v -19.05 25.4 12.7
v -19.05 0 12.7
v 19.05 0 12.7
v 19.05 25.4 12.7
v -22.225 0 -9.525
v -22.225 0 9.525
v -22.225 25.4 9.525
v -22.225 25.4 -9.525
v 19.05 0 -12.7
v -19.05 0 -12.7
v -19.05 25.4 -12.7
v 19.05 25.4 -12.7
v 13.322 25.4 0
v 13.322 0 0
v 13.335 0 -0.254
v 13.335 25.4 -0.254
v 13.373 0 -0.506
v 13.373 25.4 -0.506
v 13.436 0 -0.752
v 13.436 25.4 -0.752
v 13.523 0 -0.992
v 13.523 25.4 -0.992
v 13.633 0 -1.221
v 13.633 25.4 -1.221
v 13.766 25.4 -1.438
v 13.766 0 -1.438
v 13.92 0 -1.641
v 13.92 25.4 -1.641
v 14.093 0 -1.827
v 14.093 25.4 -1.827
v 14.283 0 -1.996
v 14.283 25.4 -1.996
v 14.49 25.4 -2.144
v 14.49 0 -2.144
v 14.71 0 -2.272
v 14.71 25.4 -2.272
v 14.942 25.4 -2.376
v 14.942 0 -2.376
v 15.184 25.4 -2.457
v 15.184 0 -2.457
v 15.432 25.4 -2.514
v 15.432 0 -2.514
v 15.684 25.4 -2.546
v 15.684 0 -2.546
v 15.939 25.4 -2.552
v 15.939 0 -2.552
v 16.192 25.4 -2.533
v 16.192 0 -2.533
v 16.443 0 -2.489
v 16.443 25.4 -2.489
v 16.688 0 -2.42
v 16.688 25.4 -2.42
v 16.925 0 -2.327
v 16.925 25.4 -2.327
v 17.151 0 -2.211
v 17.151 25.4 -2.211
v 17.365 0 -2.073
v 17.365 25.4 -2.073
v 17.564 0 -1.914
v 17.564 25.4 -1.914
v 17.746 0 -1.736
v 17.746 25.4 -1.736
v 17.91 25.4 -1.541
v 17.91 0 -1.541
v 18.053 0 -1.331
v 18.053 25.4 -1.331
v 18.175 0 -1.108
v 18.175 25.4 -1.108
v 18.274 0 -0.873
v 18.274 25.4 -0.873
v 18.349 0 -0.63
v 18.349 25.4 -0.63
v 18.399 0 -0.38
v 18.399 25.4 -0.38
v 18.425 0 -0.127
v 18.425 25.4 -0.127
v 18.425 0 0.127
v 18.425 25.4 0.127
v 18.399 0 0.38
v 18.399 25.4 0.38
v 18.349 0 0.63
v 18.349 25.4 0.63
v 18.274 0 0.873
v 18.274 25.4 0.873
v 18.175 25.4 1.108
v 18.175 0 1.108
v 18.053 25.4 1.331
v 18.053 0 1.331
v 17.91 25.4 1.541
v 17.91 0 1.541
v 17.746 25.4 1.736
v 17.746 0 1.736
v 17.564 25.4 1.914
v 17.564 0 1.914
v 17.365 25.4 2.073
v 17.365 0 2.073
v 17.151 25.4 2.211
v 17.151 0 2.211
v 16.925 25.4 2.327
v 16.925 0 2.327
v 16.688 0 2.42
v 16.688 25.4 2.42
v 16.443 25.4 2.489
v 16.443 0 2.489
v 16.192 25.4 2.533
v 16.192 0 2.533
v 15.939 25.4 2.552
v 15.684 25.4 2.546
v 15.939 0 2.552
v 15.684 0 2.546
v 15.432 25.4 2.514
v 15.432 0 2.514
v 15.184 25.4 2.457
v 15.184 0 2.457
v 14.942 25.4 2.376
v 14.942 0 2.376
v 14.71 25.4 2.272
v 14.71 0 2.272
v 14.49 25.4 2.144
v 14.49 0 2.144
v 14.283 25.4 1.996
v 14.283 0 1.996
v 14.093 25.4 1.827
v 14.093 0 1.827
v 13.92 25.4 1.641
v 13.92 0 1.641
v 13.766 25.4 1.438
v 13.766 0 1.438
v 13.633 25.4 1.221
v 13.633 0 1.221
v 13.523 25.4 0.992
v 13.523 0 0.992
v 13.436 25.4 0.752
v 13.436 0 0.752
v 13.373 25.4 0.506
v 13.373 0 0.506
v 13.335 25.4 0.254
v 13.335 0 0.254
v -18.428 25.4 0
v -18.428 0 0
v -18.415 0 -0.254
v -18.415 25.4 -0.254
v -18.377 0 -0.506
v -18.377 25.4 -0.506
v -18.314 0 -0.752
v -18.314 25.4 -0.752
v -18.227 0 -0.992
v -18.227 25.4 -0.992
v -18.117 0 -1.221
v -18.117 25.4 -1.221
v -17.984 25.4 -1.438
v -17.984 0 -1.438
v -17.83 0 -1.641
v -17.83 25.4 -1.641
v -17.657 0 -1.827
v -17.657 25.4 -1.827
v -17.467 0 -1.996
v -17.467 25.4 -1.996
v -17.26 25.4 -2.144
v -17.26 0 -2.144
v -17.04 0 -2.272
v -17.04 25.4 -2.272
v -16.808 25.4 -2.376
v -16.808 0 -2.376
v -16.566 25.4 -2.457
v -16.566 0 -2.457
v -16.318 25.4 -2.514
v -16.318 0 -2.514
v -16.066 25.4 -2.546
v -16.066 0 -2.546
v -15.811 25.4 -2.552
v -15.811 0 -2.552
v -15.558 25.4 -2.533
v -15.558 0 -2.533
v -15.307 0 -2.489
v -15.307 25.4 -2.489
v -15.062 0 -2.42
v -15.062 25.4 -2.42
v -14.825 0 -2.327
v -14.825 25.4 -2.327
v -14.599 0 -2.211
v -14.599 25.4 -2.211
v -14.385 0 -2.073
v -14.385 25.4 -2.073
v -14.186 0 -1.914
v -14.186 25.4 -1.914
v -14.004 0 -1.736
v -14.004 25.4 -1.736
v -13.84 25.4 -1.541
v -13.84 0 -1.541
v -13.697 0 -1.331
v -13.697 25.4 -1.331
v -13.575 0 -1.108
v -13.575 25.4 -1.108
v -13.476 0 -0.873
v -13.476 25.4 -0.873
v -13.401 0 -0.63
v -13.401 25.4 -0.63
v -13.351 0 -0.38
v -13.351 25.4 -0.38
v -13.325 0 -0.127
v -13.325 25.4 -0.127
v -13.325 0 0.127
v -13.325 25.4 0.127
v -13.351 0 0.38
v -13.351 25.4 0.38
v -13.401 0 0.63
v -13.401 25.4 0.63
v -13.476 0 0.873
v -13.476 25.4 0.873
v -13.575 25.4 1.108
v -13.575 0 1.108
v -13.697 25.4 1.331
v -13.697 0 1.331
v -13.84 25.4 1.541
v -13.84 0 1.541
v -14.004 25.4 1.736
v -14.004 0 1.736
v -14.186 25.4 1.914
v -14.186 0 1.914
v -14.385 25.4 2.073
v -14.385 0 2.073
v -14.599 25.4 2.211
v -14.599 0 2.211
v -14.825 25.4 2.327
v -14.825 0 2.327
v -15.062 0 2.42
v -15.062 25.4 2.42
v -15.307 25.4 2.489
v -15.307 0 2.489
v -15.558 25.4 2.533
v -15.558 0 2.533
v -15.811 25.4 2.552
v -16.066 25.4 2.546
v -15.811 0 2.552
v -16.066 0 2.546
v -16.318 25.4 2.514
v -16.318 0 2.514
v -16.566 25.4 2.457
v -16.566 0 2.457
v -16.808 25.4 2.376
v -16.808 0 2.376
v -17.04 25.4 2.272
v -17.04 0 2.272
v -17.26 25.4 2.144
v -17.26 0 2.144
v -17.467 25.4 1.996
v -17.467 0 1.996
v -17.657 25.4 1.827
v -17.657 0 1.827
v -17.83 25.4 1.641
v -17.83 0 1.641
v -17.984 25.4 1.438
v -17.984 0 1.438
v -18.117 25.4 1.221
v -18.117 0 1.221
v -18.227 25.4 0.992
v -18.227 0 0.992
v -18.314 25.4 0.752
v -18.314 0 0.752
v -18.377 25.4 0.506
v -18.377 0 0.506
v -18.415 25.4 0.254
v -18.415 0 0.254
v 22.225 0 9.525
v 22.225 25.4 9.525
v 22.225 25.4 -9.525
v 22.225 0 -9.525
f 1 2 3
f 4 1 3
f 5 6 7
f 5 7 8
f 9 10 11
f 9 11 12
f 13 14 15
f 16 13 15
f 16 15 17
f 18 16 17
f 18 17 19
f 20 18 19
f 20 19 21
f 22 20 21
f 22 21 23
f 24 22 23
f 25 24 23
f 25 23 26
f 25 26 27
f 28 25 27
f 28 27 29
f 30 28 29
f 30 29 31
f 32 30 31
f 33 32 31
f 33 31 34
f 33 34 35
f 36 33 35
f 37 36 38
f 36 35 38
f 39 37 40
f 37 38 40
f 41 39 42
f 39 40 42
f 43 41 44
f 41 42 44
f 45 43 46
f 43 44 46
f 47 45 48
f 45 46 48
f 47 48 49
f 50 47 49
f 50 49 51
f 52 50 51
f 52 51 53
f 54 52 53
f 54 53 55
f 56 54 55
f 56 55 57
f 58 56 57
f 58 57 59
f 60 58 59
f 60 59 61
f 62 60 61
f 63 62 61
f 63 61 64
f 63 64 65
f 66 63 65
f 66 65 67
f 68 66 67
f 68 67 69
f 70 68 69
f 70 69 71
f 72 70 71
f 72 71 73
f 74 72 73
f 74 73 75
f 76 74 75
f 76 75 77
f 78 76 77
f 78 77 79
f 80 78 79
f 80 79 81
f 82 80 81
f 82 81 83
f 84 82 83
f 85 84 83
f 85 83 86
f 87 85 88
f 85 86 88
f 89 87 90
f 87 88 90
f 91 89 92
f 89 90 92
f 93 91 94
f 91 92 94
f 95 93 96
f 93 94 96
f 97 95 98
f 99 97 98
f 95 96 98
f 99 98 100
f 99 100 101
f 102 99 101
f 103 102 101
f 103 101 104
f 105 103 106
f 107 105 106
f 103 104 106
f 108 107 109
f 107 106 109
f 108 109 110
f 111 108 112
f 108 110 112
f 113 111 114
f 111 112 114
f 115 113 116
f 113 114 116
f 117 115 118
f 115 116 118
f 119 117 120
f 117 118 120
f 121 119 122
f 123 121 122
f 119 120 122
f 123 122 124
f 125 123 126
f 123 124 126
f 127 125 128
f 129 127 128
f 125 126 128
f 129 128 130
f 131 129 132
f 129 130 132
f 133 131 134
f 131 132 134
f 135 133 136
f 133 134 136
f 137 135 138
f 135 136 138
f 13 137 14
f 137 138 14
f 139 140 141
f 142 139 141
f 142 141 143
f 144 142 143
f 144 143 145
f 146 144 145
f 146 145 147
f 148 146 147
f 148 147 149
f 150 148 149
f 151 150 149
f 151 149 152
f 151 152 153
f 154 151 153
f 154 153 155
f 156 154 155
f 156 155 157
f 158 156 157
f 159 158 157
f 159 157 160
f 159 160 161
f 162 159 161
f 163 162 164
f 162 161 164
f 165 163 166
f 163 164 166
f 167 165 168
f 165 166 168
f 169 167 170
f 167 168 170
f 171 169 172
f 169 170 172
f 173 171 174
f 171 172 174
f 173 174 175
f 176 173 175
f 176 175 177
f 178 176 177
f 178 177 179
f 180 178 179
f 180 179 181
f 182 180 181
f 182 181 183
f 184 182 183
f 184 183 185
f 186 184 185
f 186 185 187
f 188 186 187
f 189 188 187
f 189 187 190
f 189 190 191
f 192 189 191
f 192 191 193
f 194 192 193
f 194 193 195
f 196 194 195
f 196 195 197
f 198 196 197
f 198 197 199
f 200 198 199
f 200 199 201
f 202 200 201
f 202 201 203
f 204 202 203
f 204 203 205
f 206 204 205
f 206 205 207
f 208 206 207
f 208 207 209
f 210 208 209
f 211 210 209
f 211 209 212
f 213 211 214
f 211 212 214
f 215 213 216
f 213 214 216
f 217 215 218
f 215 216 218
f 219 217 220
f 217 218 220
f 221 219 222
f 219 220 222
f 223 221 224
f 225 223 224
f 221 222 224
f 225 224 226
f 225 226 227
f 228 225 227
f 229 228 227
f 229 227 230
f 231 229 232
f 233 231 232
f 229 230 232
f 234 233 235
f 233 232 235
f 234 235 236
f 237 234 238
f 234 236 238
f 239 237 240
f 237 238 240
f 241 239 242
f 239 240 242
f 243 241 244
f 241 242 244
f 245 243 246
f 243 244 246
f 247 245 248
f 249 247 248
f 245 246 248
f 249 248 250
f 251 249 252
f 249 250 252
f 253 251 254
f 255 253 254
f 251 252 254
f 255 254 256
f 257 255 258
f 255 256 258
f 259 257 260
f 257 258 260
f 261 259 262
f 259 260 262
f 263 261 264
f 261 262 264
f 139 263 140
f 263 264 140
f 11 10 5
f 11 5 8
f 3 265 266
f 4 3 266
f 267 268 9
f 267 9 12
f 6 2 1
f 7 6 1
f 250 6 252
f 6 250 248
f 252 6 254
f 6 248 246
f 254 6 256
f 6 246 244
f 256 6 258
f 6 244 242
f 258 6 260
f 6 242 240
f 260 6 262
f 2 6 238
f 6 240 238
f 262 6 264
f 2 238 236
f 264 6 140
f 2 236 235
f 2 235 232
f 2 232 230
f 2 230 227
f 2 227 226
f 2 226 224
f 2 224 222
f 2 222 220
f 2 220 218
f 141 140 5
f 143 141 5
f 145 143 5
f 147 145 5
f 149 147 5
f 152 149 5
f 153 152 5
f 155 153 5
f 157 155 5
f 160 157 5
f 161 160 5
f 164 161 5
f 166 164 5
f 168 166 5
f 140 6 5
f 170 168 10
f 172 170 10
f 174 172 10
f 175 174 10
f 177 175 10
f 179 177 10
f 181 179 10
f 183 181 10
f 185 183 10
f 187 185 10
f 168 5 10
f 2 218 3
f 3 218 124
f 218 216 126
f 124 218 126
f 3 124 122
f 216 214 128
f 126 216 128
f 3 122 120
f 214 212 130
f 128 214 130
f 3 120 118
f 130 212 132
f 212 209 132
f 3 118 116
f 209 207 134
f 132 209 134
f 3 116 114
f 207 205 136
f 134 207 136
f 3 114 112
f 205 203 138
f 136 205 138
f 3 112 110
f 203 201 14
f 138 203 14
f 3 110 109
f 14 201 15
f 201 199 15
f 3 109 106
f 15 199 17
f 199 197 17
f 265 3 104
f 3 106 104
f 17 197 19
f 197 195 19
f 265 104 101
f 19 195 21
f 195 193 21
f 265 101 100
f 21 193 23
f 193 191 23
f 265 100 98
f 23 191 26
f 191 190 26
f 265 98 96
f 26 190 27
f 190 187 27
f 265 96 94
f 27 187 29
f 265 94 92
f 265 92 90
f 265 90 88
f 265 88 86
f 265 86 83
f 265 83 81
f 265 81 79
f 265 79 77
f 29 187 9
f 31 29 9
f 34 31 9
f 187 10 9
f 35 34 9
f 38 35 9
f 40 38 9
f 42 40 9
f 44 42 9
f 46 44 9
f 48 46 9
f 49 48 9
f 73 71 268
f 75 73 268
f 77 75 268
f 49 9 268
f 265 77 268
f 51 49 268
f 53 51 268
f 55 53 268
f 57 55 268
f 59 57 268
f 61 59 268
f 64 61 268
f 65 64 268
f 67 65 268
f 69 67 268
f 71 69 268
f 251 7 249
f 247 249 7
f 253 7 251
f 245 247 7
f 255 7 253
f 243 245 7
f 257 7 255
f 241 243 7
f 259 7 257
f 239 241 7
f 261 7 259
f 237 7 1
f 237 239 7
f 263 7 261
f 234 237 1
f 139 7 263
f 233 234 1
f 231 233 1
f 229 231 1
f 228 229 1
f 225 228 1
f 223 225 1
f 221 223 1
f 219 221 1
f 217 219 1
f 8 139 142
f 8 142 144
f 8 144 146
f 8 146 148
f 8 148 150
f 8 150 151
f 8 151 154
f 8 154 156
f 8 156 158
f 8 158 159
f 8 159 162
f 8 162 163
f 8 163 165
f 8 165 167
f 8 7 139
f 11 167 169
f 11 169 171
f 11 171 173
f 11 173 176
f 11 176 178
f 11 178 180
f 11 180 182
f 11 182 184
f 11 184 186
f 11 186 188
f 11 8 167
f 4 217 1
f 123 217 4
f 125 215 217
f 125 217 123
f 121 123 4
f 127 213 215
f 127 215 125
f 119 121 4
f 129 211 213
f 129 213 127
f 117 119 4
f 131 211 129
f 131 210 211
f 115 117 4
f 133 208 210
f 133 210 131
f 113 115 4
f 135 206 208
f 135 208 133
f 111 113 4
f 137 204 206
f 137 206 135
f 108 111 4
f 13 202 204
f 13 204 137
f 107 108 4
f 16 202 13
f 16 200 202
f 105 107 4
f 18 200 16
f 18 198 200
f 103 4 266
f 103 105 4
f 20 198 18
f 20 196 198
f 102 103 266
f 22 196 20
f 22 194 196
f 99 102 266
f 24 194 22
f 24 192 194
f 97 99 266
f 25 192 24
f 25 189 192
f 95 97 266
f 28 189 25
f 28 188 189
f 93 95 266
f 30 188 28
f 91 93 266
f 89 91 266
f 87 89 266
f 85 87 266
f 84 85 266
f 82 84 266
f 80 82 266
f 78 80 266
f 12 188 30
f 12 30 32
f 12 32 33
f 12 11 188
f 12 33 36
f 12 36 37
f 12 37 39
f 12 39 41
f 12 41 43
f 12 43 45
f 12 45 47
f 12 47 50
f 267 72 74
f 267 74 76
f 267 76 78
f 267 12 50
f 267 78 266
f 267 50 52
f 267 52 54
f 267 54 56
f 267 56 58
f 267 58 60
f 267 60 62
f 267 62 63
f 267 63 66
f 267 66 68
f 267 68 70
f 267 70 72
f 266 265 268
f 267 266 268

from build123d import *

# Parameters (mm, degrees)
SKETCH1_W              = 44.45
SKETCH1_H              = 25.4
BOSS_EXTRUDE1_DEPTH    = 25.4
F_10_CLEARANCE_HOLE1_D = 5.1054
CHAMFER1_SIZE          = 3.175


with BuildPart() as part:
    # Sketch1 → Boss-Extrude1 (new body)
    with BuildSketch(Plane(origin=(0, 0, 0), x_dir=(1, 0, 0), z_dir=(0, 1, 0))):
        Rectangle(SKETCH1_W, SKETCH1_H)
    extrude(amount=BOSS_EXTRUDE1_DEPTH)

    # #10 Clearance Hole1 (through all)
    with Locations(Plane(origin=(0, 25.4, 0), x_dir=(1, 0, 0), z_dir=(0, 1, 0))):
        with Locations((-15.875, 0), (15.875, 0)):
            Hole(F_10_CLEARANCE_HOLE1_D / 2)

    # Chamfer1
    chamfer1_edges = [part.edges().sort_by_distance(p)[0] for p in [
        (22.225, 12.7, 12.7),
        (-22.225, 12.7, 12.7),
        (-22.225, 12.7, -12.7),
        (22.225, 12.7, -12.7),
    ]]
    chamfer(chamfer1_edges, length=CHAMFER1_SIZE)


solid = part.part
